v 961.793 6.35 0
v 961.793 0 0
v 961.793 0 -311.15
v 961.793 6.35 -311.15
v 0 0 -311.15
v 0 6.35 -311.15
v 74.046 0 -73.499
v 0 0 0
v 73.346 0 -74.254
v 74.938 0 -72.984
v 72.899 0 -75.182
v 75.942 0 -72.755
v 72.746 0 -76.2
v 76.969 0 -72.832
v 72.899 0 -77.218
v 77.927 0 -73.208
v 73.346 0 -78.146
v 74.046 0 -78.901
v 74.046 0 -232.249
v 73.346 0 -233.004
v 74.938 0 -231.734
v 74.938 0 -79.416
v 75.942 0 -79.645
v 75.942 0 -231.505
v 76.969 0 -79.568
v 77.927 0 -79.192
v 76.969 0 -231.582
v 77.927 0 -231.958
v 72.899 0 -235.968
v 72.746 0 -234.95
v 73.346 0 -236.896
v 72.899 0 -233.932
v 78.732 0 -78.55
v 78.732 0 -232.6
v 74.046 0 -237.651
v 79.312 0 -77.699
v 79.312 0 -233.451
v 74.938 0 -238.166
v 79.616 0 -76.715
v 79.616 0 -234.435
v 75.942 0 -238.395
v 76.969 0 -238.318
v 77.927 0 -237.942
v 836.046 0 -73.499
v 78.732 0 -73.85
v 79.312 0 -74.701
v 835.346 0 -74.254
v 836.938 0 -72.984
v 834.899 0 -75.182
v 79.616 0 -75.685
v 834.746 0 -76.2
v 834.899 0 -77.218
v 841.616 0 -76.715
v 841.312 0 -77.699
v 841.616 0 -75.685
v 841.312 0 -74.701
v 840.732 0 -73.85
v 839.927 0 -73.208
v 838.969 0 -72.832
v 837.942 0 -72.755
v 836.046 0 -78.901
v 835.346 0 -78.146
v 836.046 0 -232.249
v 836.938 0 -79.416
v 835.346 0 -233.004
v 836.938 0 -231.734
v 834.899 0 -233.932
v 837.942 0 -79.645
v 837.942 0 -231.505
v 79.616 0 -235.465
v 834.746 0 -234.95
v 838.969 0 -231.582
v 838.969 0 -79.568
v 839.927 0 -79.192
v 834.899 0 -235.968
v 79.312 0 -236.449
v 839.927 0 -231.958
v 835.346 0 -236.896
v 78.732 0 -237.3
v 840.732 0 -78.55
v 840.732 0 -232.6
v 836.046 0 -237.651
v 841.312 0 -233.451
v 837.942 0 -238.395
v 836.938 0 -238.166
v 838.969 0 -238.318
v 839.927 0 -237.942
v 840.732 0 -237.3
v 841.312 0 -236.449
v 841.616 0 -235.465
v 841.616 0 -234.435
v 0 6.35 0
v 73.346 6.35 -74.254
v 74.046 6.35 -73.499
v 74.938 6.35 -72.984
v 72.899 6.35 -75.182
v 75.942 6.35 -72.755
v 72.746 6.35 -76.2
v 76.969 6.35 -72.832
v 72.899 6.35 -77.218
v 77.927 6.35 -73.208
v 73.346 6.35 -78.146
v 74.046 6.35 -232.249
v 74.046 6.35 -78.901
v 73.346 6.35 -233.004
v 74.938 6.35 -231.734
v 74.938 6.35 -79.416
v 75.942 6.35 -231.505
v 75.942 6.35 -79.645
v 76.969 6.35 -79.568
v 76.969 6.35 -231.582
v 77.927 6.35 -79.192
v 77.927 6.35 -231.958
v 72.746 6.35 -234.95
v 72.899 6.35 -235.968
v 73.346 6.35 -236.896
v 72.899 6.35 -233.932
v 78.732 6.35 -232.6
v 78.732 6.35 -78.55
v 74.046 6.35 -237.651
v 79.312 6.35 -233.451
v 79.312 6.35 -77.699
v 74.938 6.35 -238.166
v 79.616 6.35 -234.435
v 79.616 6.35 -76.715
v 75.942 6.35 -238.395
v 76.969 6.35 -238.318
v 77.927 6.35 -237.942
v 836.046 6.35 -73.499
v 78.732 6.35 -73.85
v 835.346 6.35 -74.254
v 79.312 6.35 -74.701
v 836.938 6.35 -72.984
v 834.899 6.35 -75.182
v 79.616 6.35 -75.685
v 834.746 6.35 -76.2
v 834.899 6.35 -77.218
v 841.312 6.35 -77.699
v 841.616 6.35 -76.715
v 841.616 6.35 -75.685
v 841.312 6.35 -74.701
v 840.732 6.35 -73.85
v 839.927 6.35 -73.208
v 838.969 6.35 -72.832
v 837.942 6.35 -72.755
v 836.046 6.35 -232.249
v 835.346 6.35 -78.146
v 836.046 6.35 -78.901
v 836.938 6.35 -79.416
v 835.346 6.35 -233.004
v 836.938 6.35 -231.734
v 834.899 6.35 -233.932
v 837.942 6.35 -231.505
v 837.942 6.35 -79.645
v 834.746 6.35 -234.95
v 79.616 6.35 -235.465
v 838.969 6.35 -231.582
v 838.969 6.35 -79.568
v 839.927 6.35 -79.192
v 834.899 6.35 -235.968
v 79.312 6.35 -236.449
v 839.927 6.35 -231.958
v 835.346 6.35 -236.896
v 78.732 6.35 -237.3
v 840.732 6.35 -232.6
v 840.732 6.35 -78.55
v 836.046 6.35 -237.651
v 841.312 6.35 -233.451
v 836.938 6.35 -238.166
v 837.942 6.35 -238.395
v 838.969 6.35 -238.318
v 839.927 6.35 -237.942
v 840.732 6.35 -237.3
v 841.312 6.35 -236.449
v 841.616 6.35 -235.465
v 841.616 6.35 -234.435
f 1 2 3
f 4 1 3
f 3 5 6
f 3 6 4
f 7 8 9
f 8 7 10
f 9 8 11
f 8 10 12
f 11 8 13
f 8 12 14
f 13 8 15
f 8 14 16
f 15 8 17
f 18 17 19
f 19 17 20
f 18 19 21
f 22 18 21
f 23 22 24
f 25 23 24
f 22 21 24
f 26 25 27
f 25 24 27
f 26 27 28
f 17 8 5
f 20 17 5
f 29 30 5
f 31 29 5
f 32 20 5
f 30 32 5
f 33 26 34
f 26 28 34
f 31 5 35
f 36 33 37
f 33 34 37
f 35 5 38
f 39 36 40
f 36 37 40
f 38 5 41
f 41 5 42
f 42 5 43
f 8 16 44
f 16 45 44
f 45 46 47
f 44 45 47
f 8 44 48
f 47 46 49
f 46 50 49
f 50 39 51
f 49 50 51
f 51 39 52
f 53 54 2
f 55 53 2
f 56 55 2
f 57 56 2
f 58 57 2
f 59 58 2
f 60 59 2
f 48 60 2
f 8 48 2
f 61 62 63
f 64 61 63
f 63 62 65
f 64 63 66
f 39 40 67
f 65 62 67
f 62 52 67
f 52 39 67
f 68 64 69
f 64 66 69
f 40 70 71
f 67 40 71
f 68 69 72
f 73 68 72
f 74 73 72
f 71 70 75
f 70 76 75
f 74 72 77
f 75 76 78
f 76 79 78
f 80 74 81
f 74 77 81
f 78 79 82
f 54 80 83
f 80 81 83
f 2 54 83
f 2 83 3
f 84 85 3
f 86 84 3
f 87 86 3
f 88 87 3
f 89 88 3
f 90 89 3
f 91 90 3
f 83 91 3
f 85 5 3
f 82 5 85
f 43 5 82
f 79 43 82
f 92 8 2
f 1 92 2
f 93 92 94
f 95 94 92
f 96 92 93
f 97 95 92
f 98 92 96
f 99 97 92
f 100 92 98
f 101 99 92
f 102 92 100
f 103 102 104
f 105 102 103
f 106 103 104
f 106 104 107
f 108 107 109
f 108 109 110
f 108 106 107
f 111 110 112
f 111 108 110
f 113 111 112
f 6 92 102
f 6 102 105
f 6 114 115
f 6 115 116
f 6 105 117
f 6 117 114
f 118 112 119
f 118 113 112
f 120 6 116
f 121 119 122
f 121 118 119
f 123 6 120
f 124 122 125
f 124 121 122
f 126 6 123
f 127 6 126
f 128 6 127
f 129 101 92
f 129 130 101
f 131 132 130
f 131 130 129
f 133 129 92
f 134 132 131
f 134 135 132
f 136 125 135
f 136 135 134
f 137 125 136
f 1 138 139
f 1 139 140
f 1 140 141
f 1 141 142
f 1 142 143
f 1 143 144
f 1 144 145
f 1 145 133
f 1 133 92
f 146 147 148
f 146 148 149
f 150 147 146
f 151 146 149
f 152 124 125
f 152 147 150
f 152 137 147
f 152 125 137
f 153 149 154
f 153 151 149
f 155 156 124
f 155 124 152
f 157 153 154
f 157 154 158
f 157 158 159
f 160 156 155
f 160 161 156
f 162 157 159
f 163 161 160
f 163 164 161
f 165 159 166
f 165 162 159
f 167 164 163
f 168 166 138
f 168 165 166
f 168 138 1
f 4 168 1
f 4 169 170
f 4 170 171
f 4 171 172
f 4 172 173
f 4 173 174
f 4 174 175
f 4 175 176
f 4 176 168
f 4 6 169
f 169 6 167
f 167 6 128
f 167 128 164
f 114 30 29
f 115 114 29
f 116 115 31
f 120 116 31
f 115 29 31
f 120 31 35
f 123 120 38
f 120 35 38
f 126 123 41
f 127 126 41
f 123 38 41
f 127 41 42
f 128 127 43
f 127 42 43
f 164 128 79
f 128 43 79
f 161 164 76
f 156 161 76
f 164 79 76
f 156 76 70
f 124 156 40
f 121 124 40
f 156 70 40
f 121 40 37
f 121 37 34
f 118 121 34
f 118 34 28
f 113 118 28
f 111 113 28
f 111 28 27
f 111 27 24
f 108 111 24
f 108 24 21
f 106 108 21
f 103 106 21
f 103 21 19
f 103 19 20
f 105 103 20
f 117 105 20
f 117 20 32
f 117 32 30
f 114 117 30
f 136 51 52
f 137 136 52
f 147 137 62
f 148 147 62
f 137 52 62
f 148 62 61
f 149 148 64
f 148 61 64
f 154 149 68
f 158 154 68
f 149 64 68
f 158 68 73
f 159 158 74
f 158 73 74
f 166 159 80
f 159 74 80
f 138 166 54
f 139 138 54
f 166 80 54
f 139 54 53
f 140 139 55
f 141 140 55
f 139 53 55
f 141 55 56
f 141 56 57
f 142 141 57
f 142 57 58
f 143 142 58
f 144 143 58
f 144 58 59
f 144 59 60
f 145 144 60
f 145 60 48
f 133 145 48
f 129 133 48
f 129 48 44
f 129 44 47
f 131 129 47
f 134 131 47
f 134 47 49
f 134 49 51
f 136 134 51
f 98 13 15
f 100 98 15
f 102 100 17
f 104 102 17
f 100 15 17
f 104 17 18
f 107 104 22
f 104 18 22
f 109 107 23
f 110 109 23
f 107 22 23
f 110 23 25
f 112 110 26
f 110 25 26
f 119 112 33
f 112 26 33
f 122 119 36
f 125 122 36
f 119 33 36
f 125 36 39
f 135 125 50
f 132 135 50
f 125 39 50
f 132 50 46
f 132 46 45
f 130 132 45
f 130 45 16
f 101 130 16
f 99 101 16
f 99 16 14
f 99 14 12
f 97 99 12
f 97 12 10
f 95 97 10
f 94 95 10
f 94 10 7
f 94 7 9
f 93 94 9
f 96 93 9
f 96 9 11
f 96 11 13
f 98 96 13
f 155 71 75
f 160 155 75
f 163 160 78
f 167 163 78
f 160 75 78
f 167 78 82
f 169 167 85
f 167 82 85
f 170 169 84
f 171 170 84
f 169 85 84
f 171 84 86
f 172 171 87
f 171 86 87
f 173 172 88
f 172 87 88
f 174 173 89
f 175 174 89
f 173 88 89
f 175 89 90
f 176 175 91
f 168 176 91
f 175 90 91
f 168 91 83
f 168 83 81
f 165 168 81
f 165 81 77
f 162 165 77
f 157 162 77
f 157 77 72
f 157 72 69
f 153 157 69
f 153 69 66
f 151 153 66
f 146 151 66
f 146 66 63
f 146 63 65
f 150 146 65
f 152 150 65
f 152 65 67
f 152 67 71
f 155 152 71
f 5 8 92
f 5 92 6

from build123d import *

# Parameters (mm, degrees)
SKETCH1_W                    = 961.792682927
SKETCH1_H                    = 311.15
BOSS_EXTRUDE1_DEPTH          = 6.35
TAP_DRILL_FOR_5_16_24_TAP1_D = 6.9088
TAP_DRILL_FOR_5_16_24_TAP2_D = 6.9088
TAP_DRILL_FOR_5_16_24_TAP3_D = 6.9088
TAP_DRILL_FOR_5_16_24_TAP4_D = 6.9088


with BuildPart() as part:
    # Sketch1 → Boss-Extrude1 (new body)
    with BuildSketch(Plane(origin=(0, 0, 0), x_dir=(1, 0, 0), z_dir=(0, 1, 0))):
        with Locations((480.896341464, 155.575)):
            Rectangle(SKETCH1_W, SKETCH1_H)
    extrude(amount=BOSS_EXTRUDE1_DEPTH)

    # Tap Drill for 5/16-24 Tap1 (through all)
    with Locations(Plane(origin=(0, 6.35, 0), x_dir=(1, 0, 0), z_dir=(0, 1, 0))):
        with Locations((76.2, 76.2)):
            Hole(TAP_DRILL_FOR_5_16_24_TAP1_D / 2)

    # Tap Drill for 5/16-24 Tap2 (through all)
    with Locations(Plane(origin=(0, 6.35, 0), x_dir=(1, 0, 0), z_dir=(0, 1, 0))):
        with Locations((76.2, 234.95)):
            Hole(TAP_DRILL_FOR_5_16_24_TAP2_D / 2)

    # Tap Drill for 5/16-24 Tap3 (through all)
    with Locations(Plane(origin=(0, 6.35, 0), x_dir=(1, 0, 0), z_dir=(0, 1, 0))):
        with Locations((838.2, 76.2)):
            Hole(TAP_DRILL_FOR_5_16_24_TAP3_D / 2)

    # Tap Drill for 5/16-24 Tap4 (through all)
    with Locations(Plane(origin=(0, 6.35, 0), x_dir=(1, 0, 0), z_dir=(0, 1, 0))):
        with Locations((838.2, 234.95)):
            Hole(TAP_DRILL_FOR_5_16_24_TAP4_D / 2)


solid = part.part
